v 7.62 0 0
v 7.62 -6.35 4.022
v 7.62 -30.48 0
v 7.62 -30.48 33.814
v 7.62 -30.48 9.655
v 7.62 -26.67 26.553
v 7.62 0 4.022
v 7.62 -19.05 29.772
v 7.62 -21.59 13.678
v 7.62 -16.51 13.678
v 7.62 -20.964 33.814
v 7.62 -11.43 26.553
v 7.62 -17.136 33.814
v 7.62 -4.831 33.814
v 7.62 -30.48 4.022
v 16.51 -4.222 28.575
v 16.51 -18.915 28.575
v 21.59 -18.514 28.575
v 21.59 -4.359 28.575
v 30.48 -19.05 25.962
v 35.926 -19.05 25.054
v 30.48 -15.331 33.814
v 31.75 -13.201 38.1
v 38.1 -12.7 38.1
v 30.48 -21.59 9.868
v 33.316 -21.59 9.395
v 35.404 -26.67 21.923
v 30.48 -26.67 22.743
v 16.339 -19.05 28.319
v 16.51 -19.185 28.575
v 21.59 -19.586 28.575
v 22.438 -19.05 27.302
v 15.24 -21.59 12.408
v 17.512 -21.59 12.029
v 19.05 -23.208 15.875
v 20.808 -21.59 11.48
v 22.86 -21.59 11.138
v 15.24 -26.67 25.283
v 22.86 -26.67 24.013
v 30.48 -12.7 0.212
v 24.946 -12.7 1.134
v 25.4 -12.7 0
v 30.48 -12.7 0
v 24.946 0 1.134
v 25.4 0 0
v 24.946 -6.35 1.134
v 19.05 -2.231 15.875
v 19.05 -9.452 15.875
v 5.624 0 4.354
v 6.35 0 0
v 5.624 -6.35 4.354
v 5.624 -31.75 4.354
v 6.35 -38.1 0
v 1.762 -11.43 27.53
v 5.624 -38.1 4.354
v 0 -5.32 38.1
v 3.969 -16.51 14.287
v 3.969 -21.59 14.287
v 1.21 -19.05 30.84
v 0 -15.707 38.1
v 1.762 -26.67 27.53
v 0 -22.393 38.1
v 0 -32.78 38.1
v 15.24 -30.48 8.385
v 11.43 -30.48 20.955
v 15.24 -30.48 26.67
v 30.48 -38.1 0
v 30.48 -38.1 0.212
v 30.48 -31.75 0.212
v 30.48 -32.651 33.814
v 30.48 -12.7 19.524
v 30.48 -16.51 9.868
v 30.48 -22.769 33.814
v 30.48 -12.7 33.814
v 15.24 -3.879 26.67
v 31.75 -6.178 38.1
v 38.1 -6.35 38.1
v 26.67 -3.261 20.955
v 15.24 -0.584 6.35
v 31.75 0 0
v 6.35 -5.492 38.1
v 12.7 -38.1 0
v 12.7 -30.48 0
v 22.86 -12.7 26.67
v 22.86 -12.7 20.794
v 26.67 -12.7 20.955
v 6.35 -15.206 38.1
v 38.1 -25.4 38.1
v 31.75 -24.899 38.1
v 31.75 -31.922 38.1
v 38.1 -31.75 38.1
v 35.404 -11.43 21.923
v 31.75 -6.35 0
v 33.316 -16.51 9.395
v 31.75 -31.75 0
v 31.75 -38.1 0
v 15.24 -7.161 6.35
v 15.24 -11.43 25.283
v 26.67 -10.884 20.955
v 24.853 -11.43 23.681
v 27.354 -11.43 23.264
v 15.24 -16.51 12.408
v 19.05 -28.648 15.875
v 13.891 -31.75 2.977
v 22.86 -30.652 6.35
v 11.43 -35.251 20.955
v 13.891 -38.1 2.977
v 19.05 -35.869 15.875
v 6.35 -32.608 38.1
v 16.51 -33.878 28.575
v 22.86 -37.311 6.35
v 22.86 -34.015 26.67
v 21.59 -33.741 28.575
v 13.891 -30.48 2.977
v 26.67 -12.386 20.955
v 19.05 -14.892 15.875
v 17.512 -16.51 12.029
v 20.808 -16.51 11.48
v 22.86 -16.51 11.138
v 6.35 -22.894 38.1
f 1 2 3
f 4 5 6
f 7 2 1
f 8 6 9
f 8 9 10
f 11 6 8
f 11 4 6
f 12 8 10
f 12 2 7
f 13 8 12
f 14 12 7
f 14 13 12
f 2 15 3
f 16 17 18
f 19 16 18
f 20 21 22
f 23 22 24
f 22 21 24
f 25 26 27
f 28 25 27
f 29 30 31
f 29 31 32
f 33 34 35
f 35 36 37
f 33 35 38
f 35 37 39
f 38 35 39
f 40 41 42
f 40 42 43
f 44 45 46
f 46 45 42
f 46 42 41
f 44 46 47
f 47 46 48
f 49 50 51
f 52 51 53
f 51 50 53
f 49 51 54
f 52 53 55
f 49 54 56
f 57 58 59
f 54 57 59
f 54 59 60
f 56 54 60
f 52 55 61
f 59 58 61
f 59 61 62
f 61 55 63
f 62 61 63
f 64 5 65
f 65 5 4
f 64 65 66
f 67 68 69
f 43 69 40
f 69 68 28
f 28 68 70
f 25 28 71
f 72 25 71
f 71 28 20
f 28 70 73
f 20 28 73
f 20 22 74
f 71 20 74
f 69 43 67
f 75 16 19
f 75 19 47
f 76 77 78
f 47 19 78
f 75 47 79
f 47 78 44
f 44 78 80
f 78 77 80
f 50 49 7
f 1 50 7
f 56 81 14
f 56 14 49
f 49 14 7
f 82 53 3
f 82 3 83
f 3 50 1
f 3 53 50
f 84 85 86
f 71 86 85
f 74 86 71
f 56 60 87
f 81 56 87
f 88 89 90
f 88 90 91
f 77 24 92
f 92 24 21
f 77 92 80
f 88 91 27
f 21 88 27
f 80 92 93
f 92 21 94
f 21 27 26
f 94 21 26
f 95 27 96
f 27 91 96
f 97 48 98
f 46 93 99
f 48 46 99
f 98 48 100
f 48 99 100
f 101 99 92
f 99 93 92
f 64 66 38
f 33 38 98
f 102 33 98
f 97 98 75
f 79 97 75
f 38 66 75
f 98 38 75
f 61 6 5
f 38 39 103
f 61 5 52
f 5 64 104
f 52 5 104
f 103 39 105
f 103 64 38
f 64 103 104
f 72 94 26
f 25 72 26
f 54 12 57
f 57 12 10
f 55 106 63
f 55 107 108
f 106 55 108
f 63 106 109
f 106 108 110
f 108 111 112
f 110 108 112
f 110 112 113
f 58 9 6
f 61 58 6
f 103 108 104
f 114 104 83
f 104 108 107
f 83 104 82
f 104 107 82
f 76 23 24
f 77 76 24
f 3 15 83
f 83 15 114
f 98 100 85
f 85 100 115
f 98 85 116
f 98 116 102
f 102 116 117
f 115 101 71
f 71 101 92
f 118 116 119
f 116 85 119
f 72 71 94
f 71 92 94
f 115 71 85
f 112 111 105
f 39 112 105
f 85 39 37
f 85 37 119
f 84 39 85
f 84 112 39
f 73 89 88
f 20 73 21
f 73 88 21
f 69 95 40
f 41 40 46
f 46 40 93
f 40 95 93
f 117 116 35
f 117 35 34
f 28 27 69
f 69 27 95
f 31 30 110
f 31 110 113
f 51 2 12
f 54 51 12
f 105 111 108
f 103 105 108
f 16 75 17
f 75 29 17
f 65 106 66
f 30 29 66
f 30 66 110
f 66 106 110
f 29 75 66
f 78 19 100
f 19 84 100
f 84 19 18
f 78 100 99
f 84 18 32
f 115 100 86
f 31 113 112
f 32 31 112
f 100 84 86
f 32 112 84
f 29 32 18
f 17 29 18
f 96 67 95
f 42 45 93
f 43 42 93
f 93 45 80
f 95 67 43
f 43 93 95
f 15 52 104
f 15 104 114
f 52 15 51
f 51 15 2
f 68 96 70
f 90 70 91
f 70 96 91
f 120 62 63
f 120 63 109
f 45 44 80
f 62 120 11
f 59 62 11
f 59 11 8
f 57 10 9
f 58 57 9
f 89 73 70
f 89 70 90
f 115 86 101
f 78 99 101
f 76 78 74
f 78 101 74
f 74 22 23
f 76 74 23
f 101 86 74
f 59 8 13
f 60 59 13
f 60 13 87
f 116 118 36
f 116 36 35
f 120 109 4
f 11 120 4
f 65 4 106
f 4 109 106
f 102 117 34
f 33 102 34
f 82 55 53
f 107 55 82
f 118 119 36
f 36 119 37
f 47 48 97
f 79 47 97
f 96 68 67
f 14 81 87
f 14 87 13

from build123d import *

# Parameters (mm, degrees)
F0_W     = 38.1
F0_H     = 38.1
F1_DEPTH = 38.1
F3_DEPTH = 38.1
F5_DEPTH = 38.1
F7_W     = 7.62
F7_H     = 25.4
F7_H_2   = 30.48
F8_DEPTH = 38.1


with BuildPart() as f1:
    # F0 (on Front) → F1 (new body)
    with BuildSketch(Plane.XZ):
        with Locations((19.05, 19.05)):
            Rectangle(F0_W, F0_H)
    extrude(amount=F1_DEPTH)

    # F2 (on face) → F3 (cut)
    with BuildSketch(Plane.XZ.offset(38.1)):
        Polygon((31.75, 38.1), (6.35, 38.1), (11.43, 20.955), (16.51, 28.575), (21.59, 28.575), (26.67, 20.955), align=None)
        Polygon((0, 38.1), (0, 0), (6.35, 0), align=None)
        Polygon((19.05, 15.875), (19.05, 0), (25.4, 0), align=None)
        Polygon((19.05, 15.875), (12.7, 0), (19.05, 0), align=None)
        Polygon((38.1, 0), (38.1, 38.1), (31.75, 0), align=None)
    extrude(amount=-F3_DEPTH, mode=Mode.SUBTRACT)

    # F4 (on face) → F5 (cut)
    with BuildSketch(Plane(origin=(30.891892, 0, -5.148649), x_dir=(0, 1, 0), z_dir=(0.986394, 0, -0.164399))):
        Polygon((-6.35, 43.84521), (0, 5.219668), (0, 43.84521), align=None)
        Polygon((-12.7, 43.84521), (-19.05, 43.84521), (-19.05, 30.619668), align=None)
        Polygon((-19.05, 43.84521), (-25.4, 43.84521), (-19.05, 30.619668), align=None)
        Polygon((-26.67, 27.444668), (-31.75, 5.219668), (-6.35, 5.219668), (-11.43, 27.444668), (-16.51, 14.744668), (-21.59, 14.744668), align=None)
        Polygon((-31.75, 43.84521), (-38.1, 43.84521), (-38.1, 5.219668), align=None)
    extrude(amount=-F5_DEPTH, mode=Mode.SUBTRACT)

    # F7 (on offset) → F8 (cut)
    with BuildSketch(Plane.XY.offset(38.1)):
        with Locations((26.67, -25.4)):
            Rectangle(F7_W, F7_H)
        with Locations((11.43, -15.24)):
            Rectangle(F7_W, F7_H_2)
    extrude(amount=-F8_DEPTH, mode=Mode.SUBTRACT)


solid = f1.part
